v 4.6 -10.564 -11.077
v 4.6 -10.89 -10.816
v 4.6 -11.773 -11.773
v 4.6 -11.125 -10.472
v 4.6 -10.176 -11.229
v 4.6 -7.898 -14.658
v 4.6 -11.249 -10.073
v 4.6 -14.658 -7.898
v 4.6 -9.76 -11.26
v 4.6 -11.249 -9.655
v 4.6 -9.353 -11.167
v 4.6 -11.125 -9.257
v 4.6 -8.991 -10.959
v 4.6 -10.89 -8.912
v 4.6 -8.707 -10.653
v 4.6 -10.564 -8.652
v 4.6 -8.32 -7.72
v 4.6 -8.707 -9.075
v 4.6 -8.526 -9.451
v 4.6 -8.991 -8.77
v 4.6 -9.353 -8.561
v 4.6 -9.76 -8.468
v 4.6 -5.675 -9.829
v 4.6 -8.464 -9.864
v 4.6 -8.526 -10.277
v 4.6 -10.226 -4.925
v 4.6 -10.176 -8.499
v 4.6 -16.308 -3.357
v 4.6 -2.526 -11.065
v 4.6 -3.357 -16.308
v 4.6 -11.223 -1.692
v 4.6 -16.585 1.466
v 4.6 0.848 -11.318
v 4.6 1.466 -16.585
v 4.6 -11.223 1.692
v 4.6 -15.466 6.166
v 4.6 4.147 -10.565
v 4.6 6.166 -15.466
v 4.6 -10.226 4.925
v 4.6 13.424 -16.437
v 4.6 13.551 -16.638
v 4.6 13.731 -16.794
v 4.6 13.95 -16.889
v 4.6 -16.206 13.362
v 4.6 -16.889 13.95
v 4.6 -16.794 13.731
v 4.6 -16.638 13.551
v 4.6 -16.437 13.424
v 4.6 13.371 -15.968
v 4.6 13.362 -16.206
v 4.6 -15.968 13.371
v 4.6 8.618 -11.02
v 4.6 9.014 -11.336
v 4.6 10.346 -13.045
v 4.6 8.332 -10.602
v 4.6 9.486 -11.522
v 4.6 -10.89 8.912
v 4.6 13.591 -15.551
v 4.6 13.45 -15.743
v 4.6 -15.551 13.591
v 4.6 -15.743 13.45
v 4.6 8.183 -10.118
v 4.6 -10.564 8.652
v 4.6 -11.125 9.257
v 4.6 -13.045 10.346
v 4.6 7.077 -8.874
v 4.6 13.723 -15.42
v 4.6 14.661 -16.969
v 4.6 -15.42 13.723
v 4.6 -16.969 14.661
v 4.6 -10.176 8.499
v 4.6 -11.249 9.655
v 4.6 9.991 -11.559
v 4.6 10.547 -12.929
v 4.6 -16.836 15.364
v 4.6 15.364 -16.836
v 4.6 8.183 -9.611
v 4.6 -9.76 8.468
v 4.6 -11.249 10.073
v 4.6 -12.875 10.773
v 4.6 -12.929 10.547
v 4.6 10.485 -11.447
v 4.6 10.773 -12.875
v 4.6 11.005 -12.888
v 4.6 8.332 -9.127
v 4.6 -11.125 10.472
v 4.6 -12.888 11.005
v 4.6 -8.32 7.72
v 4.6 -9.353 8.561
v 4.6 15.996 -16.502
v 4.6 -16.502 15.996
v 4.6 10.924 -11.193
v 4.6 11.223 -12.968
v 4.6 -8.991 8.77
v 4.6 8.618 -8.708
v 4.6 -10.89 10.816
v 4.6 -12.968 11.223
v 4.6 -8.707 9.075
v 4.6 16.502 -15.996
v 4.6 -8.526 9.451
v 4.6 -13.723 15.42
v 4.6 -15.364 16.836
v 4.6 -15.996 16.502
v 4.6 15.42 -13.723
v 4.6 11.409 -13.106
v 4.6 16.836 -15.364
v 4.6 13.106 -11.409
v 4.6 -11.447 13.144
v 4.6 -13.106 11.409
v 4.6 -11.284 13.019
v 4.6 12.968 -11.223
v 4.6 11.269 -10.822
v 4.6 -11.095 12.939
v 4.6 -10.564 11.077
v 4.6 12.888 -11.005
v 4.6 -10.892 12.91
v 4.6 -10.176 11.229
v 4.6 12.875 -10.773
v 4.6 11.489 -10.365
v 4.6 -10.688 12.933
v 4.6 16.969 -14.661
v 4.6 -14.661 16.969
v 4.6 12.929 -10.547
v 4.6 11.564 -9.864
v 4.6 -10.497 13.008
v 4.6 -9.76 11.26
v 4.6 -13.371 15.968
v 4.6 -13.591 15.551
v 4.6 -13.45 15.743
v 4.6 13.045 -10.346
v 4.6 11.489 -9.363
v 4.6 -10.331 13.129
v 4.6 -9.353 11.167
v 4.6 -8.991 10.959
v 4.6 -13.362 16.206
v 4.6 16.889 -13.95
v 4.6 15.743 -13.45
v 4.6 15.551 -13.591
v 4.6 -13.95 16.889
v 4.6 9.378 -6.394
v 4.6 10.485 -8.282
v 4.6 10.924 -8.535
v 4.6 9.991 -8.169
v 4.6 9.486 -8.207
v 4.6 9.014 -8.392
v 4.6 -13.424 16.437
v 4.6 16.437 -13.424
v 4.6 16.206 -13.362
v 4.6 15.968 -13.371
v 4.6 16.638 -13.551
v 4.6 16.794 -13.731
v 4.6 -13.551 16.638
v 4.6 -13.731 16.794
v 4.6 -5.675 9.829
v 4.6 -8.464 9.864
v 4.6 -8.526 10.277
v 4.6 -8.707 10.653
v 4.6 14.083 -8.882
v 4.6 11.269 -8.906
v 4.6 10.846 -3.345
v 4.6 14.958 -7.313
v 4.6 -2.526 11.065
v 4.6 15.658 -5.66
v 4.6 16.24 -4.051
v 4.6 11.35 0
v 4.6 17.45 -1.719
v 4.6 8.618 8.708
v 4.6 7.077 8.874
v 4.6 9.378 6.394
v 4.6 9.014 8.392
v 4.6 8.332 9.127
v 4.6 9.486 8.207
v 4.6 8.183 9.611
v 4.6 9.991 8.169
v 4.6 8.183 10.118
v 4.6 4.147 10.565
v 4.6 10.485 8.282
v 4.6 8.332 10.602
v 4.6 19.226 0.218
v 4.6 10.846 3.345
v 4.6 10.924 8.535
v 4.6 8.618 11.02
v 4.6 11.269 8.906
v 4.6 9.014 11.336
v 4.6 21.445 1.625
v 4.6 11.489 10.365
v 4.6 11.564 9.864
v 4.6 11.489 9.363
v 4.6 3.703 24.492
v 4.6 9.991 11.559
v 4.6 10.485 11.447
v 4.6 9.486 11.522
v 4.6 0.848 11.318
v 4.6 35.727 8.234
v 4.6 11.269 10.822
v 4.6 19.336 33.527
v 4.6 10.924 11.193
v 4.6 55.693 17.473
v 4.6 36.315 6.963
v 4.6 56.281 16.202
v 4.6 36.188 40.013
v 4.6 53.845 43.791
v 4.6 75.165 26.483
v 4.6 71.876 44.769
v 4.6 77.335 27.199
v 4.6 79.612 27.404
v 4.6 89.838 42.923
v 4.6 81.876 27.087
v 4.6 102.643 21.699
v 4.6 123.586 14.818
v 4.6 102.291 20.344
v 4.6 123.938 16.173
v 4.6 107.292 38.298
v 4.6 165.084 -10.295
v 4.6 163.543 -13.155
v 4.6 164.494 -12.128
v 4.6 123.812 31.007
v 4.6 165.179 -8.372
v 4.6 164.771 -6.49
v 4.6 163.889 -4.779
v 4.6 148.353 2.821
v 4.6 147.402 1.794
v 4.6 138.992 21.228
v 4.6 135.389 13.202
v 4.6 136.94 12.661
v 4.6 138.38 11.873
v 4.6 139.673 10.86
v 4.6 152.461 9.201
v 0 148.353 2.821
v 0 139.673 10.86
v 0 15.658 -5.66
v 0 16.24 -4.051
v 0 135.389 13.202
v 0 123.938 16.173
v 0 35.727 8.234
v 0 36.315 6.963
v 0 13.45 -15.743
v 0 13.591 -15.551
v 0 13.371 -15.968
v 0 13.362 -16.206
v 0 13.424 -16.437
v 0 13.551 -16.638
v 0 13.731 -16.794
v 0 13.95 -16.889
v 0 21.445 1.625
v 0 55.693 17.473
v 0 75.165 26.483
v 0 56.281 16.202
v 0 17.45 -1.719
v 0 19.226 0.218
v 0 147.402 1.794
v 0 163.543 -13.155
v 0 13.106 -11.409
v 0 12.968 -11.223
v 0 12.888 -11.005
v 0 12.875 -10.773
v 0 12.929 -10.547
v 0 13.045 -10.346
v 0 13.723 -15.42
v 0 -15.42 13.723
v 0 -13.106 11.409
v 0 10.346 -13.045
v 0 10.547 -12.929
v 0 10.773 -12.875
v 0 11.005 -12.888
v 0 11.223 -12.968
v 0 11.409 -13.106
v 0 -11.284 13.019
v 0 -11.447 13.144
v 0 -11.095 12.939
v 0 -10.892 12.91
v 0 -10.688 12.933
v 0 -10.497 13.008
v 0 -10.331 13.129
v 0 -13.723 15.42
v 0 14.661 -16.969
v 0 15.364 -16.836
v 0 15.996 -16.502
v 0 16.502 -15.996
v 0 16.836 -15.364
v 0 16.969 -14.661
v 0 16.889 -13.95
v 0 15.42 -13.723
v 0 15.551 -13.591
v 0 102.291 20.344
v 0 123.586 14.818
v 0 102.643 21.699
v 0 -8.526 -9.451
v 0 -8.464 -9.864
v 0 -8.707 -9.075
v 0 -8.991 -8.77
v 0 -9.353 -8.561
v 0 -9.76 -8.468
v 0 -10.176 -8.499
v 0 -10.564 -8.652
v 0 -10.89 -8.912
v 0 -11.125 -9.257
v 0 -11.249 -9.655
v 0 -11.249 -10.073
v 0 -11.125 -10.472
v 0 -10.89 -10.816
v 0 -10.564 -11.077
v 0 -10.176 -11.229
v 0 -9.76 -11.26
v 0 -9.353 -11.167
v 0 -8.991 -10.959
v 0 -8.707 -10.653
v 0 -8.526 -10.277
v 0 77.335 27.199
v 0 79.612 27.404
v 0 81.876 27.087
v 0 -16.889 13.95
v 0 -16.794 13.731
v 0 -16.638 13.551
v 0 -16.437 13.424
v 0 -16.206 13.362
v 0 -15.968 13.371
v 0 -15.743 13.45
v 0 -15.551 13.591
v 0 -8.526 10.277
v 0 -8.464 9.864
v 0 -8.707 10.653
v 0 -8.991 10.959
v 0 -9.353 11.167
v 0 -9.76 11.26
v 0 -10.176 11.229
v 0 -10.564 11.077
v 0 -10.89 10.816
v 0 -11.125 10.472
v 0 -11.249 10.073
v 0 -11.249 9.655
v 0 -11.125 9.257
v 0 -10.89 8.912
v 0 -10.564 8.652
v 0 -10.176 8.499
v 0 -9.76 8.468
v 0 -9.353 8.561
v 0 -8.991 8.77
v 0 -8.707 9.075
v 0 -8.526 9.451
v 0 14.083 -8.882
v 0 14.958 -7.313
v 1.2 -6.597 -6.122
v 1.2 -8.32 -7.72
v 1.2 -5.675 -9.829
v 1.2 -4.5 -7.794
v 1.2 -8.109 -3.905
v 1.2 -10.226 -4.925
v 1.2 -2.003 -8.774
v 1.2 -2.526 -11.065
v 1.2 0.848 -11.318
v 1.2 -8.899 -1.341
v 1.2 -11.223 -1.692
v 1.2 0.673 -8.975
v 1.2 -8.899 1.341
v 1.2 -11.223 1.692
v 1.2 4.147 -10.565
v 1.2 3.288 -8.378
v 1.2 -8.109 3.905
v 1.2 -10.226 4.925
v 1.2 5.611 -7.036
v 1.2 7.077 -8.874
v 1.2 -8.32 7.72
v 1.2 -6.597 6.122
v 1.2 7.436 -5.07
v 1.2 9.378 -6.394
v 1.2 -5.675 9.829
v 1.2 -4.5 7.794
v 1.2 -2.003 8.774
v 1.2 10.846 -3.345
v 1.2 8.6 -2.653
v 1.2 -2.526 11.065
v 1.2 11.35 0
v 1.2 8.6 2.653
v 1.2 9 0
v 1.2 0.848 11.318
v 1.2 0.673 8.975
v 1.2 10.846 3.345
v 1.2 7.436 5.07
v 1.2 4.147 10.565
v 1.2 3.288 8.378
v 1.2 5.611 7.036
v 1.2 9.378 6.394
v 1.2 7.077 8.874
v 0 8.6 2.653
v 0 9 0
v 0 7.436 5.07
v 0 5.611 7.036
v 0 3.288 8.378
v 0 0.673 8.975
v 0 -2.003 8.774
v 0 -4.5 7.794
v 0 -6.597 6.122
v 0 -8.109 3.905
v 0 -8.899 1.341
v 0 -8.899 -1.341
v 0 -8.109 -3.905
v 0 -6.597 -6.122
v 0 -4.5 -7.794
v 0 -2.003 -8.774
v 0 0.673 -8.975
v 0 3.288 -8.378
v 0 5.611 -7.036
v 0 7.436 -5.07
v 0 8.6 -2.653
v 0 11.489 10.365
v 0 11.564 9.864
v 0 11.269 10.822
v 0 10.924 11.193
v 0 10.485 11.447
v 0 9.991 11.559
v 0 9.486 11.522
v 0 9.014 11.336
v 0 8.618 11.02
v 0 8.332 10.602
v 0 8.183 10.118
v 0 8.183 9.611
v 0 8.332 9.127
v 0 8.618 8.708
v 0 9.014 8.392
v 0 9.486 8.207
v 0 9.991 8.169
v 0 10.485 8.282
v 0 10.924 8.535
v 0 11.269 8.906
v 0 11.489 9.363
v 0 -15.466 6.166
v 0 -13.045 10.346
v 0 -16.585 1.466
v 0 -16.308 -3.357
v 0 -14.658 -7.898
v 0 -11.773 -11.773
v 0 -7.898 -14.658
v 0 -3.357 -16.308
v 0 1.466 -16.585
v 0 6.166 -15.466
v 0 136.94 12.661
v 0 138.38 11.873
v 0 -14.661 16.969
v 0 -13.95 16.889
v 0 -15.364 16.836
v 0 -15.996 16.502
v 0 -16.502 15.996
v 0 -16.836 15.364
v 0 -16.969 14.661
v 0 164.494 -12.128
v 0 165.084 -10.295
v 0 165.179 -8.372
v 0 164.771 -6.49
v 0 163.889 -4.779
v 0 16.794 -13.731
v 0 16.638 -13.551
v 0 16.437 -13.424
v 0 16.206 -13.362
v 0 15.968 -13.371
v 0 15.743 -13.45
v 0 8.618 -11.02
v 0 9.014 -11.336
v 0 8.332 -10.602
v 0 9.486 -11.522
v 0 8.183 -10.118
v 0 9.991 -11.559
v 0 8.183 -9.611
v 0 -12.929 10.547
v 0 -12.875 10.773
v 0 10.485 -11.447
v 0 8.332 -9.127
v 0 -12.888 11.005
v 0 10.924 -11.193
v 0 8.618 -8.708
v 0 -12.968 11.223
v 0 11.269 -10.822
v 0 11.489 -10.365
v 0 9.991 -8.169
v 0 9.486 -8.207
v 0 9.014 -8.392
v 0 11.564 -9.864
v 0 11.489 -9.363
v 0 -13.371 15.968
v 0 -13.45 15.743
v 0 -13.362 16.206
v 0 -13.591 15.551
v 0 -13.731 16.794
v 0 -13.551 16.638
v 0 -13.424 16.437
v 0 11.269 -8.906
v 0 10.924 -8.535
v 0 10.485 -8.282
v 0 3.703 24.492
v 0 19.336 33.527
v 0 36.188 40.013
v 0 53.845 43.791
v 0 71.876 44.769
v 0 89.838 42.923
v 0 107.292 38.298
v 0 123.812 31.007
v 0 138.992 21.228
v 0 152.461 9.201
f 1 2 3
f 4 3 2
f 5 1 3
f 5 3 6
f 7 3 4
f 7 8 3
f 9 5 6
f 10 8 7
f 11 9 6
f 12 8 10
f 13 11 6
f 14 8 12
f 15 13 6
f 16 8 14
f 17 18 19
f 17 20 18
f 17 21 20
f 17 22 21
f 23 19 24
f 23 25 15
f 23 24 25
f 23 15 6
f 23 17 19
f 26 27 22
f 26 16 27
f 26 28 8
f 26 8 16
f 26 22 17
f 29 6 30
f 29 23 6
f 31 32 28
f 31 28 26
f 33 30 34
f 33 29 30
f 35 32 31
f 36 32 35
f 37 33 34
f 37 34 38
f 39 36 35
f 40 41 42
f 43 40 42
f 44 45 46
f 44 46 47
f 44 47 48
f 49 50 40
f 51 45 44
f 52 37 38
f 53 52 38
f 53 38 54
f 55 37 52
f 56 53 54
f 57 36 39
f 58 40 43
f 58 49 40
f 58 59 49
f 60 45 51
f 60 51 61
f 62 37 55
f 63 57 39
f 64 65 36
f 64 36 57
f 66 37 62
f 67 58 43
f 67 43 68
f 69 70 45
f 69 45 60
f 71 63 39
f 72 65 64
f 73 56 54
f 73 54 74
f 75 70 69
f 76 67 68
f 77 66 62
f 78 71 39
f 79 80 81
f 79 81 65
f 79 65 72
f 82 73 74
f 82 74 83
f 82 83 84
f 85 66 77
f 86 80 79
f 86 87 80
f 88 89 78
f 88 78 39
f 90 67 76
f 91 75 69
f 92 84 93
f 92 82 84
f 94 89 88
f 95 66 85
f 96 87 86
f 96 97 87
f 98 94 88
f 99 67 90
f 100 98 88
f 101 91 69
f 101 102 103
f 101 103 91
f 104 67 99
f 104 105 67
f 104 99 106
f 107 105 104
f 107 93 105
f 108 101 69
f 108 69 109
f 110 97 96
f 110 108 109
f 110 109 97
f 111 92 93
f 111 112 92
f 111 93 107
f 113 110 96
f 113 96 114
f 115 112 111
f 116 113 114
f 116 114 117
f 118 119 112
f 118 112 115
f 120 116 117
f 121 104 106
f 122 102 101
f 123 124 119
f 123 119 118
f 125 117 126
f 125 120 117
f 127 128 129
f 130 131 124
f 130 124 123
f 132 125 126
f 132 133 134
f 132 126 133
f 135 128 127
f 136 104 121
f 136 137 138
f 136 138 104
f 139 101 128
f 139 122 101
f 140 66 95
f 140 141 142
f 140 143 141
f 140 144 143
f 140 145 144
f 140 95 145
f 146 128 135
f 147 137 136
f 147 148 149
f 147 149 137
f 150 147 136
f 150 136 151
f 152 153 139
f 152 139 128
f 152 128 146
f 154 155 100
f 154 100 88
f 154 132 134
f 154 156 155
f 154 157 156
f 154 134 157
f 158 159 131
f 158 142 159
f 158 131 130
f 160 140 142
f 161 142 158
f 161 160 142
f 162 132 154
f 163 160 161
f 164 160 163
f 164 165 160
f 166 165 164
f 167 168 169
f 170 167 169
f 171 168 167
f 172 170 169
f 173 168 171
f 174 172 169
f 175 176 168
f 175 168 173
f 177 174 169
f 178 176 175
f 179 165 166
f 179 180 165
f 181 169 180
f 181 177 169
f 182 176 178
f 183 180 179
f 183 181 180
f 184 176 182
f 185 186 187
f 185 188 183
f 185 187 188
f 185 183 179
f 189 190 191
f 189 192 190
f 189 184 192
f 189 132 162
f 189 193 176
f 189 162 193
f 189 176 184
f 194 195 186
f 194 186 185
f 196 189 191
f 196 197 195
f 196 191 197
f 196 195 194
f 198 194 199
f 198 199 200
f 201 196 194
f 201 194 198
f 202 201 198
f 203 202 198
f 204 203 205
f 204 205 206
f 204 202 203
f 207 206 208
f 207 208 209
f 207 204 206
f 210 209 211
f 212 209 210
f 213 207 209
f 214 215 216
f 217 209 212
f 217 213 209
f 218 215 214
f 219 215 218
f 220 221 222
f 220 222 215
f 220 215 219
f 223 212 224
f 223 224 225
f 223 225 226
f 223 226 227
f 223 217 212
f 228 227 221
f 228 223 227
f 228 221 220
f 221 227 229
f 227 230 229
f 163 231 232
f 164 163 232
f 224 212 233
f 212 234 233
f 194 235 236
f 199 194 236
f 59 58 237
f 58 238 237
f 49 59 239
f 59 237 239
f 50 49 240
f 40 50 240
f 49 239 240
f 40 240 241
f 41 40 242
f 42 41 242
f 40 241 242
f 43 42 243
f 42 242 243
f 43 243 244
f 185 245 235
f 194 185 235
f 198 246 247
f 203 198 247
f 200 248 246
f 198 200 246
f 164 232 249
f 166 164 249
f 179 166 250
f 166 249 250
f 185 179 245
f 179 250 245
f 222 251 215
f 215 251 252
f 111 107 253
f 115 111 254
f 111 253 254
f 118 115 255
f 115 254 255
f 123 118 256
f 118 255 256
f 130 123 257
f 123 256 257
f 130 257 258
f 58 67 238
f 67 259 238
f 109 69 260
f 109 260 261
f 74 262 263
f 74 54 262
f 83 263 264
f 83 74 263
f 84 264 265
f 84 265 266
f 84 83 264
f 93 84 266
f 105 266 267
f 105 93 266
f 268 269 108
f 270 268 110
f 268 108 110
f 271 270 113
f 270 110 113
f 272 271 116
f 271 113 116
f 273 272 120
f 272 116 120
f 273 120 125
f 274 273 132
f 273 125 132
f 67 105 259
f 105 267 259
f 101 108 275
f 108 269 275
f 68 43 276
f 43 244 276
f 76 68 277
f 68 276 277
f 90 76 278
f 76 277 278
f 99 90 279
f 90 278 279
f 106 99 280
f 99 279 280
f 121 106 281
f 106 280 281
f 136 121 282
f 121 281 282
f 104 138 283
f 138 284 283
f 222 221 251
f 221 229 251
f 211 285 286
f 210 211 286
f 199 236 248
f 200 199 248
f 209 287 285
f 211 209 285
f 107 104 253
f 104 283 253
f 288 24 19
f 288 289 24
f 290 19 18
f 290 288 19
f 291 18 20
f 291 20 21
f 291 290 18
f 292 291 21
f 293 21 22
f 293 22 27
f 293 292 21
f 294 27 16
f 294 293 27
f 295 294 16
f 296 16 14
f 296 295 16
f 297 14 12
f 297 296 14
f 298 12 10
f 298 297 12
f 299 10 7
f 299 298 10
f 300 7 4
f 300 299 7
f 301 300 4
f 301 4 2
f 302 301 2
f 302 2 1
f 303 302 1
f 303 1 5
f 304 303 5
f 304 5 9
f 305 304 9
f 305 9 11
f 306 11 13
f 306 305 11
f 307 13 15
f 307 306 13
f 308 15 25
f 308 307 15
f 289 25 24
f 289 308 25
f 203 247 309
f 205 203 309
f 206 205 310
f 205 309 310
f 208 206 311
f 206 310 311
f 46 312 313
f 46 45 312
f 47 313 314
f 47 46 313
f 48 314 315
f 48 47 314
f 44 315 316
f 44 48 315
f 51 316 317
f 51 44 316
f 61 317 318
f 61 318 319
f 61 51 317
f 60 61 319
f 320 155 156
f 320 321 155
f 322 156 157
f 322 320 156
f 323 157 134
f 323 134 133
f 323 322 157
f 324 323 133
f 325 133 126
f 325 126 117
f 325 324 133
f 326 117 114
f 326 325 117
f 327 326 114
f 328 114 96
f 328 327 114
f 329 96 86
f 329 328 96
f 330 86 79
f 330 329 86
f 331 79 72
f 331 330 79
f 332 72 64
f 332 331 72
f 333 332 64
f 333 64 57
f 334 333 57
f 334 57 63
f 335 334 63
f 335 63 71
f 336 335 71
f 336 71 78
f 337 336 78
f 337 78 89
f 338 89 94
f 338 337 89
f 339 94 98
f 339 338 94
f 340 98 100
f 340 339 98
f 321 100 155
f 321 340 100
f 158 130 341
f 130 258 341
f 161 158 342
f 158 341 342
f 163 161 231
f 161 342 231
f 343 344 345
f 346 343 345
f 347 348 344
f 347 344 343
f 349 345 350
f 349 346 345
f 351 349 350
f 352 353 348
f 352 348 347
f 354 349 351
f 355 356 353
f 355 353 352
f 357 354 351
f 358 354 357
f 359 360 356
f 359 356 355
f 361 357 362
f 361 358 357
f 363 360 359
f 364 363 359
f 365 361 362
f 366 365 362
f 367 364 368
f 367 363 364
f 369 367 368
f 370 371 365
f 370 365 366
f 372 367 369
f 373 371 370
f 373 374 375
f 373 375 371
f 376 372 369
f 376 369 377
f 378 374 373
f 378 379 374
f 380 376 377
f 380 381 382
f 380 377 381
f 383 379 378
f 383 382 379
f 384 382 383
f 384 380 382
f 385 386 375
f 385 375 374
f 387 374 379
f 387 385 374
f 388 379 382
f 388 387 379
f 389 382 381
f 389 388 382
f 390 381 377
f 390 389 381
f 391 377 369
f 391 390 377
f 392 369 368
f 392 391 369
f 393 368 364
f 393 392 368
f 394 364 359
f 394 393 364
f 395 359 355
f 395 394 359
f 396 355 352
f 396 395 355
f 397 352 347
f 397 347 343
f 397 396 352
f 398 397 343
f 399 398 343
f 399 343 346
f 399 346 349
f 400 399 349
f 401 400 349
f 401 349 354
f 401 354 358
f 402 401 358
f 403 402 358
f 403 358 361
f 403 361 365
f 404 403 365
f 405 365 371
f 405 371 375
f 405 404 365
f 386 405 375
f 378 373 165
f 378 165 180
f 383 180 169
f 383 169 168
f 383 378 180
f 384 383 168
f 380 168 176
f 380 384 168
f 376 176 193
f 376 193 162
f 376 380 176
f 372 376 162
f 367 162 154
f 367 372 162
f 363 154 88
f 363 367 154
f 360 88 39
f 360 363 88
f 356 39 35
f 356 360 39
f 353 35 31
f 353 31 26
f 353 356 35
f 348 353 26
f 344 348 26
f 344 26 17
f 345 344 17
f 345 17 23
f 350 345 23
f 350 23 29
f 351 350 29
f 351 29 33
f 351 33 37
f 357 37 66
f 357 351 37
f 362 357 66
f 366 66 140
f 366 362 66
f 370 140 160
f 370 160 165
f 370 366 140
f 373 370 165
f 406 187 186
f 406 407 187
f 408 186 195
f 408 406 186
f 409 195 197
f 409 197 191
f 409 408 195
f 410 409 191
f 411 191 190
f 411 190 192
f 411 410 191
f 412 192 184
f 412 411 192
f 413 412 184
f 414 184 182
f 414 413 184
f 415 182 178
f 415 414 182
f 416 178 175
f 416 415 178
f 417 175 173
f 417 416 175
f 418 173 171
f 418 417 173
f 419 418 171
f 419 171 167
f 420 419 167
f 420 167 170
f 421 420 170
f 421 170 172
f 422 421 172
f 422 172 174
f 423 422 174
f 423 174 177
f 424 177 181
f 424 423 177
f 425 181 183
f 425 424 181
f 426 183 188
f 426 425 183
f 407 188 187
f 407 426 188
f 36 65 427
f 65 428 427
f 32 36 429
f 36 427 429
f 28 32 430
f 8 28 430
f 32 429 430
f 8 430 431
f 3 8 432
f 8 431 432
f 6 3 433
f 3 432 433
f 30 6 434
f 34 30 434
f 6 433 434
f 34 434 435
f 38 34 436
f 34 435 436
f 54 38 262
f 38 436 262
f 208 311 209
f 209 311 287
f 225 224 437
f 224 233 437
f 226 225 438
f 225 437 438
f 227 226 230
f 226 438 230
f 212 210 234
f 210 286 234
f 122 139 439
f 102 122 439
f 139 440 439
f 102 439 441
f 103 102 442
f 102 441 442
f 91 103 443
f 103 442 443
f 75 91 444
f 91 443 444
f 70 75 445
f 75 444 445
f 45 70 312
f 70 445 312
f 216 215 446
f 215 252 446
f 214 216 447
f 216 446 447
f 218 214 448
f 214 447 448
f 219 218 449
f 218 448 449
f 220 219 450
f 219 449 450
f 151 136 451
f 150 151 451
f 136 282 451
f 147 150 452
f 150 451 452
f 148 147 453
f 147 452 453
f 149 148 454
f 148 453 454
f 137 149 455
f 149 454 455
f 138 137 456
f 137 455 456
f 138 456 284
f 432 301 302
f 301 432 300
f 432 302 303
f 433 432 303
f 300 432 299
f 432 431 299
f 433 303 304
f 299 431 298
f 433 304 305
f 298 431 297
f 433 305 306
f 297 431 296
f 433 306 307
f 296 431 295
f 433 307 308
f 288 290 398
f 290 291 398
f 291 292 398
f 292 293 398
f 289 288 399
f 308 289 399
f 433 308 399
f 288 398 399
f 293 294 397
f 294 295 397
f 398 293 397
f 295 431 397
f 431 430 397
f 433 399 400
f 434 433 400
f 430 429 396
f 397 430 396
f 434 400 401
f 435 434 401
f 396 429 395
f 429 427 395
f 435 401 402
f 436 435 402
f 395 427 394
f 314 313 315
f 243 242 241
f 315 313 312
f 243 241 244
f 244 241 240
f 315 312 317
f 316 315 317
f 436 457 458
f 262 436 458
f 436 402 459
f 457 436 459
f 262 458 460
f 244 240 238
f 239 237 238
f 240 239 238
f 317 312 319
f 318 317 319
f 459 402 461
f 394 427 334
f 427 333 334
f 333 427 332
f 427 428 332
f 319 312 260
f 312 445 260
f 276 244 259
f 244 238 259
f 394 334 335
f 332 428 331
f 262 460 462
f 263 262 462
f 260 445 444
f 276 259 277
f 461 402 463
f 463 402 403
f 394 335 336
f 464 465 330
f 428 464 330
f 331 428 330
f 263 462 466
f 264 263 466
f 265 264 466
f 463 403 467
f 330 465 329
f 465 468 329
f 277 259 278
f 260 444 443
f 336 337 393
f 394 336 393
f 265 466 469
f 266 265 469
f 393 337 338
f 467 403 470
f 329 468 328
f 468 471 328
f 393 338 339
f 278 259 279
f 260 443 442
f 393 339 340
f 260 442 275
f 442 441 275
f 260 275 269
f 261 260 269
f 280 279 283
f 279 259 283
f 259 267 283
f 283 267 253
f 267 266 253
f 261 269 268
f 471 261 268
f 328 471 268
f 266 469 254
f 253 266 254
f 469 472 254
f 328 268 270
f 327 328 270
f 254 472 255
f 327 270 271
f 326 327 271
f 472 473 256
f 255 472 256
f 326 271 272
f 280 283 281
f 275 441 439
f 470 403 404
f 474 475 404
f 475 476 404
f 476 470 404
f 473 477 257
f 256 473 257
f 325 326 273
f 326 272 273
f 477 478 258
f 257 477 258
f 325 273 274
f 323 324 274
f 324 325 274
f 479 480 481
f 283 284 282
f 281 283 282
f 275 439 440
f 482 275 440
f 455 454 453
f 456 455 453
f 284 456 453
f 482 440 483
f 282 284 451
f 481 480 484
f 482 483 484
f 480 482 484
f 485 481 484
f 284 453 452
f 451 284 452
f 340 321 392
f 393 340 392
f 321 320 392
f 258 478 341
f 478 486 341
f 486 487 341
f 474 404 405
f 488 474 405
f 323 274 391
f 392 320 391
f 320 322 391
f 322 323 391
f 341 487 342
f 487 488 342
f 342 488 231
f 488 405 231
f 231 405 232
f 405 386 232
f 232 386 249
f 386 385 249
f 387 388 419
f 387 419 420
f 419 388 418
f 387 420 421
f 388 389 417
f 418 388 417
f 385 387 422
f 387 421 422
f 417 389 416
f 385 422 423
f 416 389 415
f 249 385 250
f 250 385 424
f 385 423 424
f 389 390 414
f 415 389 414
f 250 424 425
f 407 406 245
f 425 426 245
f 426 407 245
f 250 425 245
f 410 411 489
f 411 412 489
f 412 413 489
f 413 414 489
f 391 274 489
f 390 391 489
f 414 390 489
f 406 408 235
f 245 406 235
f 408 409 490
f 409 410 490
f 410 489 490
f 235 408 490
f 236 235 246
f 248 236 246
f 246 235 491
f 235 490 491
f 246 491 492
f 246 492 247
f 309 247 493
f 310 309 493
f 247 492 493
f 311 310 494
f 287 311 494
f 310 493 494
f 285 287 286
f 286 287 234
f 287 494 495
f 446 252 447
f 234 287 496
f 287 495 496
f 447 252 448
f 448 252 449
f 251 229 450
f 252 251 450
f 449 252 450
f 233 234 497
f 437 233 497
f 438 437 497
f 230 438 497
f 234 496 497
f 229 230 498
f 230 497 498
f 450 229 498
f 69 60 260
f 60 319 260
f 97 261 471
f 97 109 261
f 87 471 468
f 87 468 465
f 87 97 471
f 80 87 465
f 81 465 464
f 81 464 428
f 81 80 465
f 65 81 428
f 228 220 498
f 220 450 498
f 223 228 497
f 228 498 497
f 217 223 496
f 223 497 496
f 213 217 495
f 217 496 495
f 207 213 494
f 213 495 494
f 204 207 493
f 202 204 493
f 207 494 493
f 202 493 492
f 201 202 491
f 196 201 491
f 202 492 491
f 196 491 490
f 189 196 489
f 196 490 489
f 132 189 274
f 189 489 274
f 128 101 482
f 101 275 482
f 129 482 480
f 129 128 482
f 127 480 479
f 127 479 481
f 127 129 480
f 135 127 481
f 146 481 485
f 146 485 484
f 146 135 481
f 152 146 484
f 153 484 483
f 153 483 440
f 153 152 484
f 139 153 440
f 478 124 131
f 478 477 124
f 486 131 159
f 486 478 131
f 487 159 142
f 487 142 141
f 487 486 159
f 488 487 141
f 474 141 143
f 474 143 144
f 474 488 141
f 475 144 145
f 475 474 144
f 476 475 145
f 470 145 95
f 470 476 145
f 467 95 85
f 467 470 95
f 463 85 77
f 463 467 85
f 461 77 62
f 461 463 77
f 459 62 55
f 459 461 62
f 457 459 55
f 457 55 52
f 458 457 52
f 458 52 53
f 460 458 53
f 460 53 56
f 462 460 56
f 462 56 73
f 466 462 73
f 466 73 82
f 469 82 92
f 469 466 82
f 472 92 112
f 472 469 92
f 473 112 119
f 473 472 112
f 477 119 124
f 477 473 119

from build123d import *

# Parameters (mm, degrees)
F0_R     = 1.4
F0_R_2   = 1.7
F0_R_3   = 9
F1_DEPTH = 1.2
F2_R     = 1.4
F2_R_2   = 1.7
F2_R_3   = 11.35
F3_DEPTH = 3.4
F4_R     = 0.8


with BuildPart() as f1:
    # F0 (on Right) → F1 (new body)
    with BuildSketch(Plane.YZ):
        with BuildLine():
            Line((36.315416, 6.963249), (56.281398, 16.202273))
            Line((56.281398, 16.202273), (55.69346, 17.472835))
            Line((55.69346, 17.472835), (75.164664, 26.482906))
            ThreePointArc((75.164664, 26.482906), (78.467758, 27.367196), (81.875669, 27.086954))
            Line((81.875669, 27.086954), (102.642848, 21.698686))
            Line((102.642848, 21.698686), (102.291245, 20.343557))
            Line((102.291245, 20.343557), (123.586134, 14.818369))
            Line((123.586134, 14.818369), (123.937737, 16.173498))
            Line((123.937737, 16.173498), (135.389363, 13.202251))
            ThreePointArc((135.389363, 13.202251), (137.676185, 12.296386), (139.672705, 10.859704))
            Line((139.672705, 10.859704), (148.352908, 2.820916))
            Line((148.352908, 2.820916), (147.401638, 1.793743))
            Line((147.401638, 1.793743), (163.542923, -13.154799))
            Line((163.542923, -13.154799), (164.494194, -12.127626))
            ThreePointArc((164.494194, -12.127626), (165.178749, -8.371866), (163.889187, -4.778626))
            ThreePointArc((163.889187, -4.778626), (80.505559, 44.237166), (-10.894182, 12.591239))
            Line((-10.894182, 12.591239), (-13.722609, 15.419666))
            Line((-13.722609, 15.419666), (-12.874081, 16.268194))
            ThreePointArc((-12.874081, 16.268194), (-16.268194, 16.268194), (-16.268194, 12.874081))
            Line((-16.268194, 12.874081), (-15.419666, 13.722609))
            Line((-15.419666, 13.722609), (-12.591239, 10.894182))
            ThreePointArc((-12.591239, 10.894182), (-11.773328, -11.773328), (10.894182, -12.591239))
            Line((10.894182, -12.591239), (13.722609, -15.419666))
            Line((13.722609, -15.419666), (12.874081, -16.268194))
            ThreePointArc((12.874081, -16.268194), (16.268194, -16.268194), (16.268194, -12.874081))
            Line((16.268194, -12.874081), (15.419666, -13.722609))
            Line((15.419666, -13.722609), (12.591239, -10.894182))
            ThreePointArc((12.591239, -10.894182), (14.365147, -8.418138), (15.65831, -5.660373))
            Line((15.65831, -5.660373), (16.240046, -4.051116))
            ThreePointArc((16.240046, -4.051116), (18.274186, -0.692085), (21.44488, 1.624707))
            Line((21.44488, 1.624707), (35.727478, 8.233812))
            Line((35.727478, 8.233812), (36.315416, 6.963249))
        make_face()
        with Locations((-9.86414, -9.86414)):
            Circle(F0_R, mode=Mode.SUBTRACT)
        with Locations((9.86414, -9.86414)):
            Circle(F0_R_2, mode=Mode.SUBTRACT)
        Circle(F0_R_3, mode=Mode.SUBTRACT)
        with Locations((-9.86414, 9.86414)):
            Circle(F0_R, mode=Mode.SUBTRACT)
        with Locations((9.86414, 9.86414)):
            Circle(F0_R_2, mode=Mode.SUBTRACT)
    extrude(amount=F1_DEPTH)

    # F2 (on face) → F3 (join)
    with BuildSketch(Plane.YZ.offset(1.2)):
        with BuildLine():
            Line((102.291245, 20.343557), (123.586134, 14.818369))
            Line((123.586134, 14.818369), (123.937737, 16.173498))
            Line((123.937737, 16.173498), (135.389363, 13.202251))
            ThreePointArc((135.389363, 13.202251), (137.676185, 12.296386), (139.672705, 10.859704))
            Line((139.672705, 10.859704), (148.352908, 2.820916))
            Line((148.352908, 2.820916), (147.401638, 1.793743))
            Line((147.401638, 1.793743), (163.542923, -13.154799))
            Line((163.542923, -13.154799), (164.494194, -12.127626))
            ThreePointArc((164.494194, -12.127626), (165.178749, -8.371866), (163.889187, -4.778626))
            ThreePointArc((163.889187, -4.778626), (80.505559, 44.237166), (-10.894182, 12.591239))
            Line((-10.894182, 12.591239), (-13.722609, 15.419666))
            Line((-13.722609, 15.419666), (-12.874081, 16.268194))
            ThreePointArc((-12.874081, 16.268194), (-16.268194, 16.268194), (-16.268194, 12.874081))
            Line((-16.268194, 12.874081), (-15.419666, 13.722609))
            Line((-15.419666, 13.722609), (-12.591239, 10.894182))
            ThreePointArc((-12.591239, 10.894182), (-11.773328, -11.773328), (10.894182, -12.591239))
            Line((10.894182, -12.591239), (13.722609, -15.419666))
            Line((13.722609, -15.419666), (12.874081, -16.268194))
            ThreePointArc((12.874081, -16.268194), (16.268194, -16.268194), (16.268194, -12.874081))
            Line((16.268194, -12.874081), (15.419666, -13.722609))
            Line((15.419666, -13.722609), (12.591239, -10.894182))
            ThreePointArc((12.591239, -10.894182), (14.365147, -8.418138), (15.65831, -5.660373))
            Line((15.65831, -5.660373), (16.240046, -4.051116))
            ThreePointArc((16.240046, -4.051116), (18.274186, -0.692085), (21.44488, 1.624707))
            Line((21.44488, 1.624707), (35.727478, 8.233812))
            Line((35.727478, 8.233812), (36.315416, 6.963249))
            Line((36.315416, 6.963249), (56.281398, 16.202273))
            Line((56.281398, 16.202273), (55.69346, 17.472835))
            Line((55.69346, 17.472835), (75.164664, 26.482906))
            ThreePointArc((75.164664, 26.482906), (78.467758, 27.367196), (81.875669, 27.086954))
            Line((81.875669, 27.086954), (102.642848, 21.698686))
            Line((102.642848, 21.698686), (102.291245, 20.343557))
        make_face()
        with Locations((-9.86414, -9.86414)):
            Circle(F2_R, mode=Mode.SUBTRACT)
        with Locations((9.86414, -9.86414)):
            Circle(F2_R_2, mode=Mode.SUBTRACT)
        Circle(F2_R_3, mode=Mode.SUBTRACT)
        with Locations((-9.86414, 9.86414)):
            Circle(F2_R, mode=Mode.SUBTRACT)
        with Locations((9.86414, 9.86414)):
            Circle(F2_R_2, mode=Mode.SUBTRACT)
    extrude(amount=F3_DEPTH)

    # F4
    f4_edges = [f1.edges().sort_by_distance(p)[0] for p in [
        (2.3, 12.874081, -16.268194),
        (2.3, -16.268194, 12.874081),
        (2.3, -12.874081, 16.268194),
        (2.3, 10.894182, -12.591239),
        (2.3, 12.591239, -10.894182),
        (2.3, 16.268194, -12.874081),
        (2.3, -10.894182, 12.591239),
        (2.3, -12.591239, 10.894182),
    ]]
    fillet(f4_edges, radius=F4_R)


solid = f1.part
